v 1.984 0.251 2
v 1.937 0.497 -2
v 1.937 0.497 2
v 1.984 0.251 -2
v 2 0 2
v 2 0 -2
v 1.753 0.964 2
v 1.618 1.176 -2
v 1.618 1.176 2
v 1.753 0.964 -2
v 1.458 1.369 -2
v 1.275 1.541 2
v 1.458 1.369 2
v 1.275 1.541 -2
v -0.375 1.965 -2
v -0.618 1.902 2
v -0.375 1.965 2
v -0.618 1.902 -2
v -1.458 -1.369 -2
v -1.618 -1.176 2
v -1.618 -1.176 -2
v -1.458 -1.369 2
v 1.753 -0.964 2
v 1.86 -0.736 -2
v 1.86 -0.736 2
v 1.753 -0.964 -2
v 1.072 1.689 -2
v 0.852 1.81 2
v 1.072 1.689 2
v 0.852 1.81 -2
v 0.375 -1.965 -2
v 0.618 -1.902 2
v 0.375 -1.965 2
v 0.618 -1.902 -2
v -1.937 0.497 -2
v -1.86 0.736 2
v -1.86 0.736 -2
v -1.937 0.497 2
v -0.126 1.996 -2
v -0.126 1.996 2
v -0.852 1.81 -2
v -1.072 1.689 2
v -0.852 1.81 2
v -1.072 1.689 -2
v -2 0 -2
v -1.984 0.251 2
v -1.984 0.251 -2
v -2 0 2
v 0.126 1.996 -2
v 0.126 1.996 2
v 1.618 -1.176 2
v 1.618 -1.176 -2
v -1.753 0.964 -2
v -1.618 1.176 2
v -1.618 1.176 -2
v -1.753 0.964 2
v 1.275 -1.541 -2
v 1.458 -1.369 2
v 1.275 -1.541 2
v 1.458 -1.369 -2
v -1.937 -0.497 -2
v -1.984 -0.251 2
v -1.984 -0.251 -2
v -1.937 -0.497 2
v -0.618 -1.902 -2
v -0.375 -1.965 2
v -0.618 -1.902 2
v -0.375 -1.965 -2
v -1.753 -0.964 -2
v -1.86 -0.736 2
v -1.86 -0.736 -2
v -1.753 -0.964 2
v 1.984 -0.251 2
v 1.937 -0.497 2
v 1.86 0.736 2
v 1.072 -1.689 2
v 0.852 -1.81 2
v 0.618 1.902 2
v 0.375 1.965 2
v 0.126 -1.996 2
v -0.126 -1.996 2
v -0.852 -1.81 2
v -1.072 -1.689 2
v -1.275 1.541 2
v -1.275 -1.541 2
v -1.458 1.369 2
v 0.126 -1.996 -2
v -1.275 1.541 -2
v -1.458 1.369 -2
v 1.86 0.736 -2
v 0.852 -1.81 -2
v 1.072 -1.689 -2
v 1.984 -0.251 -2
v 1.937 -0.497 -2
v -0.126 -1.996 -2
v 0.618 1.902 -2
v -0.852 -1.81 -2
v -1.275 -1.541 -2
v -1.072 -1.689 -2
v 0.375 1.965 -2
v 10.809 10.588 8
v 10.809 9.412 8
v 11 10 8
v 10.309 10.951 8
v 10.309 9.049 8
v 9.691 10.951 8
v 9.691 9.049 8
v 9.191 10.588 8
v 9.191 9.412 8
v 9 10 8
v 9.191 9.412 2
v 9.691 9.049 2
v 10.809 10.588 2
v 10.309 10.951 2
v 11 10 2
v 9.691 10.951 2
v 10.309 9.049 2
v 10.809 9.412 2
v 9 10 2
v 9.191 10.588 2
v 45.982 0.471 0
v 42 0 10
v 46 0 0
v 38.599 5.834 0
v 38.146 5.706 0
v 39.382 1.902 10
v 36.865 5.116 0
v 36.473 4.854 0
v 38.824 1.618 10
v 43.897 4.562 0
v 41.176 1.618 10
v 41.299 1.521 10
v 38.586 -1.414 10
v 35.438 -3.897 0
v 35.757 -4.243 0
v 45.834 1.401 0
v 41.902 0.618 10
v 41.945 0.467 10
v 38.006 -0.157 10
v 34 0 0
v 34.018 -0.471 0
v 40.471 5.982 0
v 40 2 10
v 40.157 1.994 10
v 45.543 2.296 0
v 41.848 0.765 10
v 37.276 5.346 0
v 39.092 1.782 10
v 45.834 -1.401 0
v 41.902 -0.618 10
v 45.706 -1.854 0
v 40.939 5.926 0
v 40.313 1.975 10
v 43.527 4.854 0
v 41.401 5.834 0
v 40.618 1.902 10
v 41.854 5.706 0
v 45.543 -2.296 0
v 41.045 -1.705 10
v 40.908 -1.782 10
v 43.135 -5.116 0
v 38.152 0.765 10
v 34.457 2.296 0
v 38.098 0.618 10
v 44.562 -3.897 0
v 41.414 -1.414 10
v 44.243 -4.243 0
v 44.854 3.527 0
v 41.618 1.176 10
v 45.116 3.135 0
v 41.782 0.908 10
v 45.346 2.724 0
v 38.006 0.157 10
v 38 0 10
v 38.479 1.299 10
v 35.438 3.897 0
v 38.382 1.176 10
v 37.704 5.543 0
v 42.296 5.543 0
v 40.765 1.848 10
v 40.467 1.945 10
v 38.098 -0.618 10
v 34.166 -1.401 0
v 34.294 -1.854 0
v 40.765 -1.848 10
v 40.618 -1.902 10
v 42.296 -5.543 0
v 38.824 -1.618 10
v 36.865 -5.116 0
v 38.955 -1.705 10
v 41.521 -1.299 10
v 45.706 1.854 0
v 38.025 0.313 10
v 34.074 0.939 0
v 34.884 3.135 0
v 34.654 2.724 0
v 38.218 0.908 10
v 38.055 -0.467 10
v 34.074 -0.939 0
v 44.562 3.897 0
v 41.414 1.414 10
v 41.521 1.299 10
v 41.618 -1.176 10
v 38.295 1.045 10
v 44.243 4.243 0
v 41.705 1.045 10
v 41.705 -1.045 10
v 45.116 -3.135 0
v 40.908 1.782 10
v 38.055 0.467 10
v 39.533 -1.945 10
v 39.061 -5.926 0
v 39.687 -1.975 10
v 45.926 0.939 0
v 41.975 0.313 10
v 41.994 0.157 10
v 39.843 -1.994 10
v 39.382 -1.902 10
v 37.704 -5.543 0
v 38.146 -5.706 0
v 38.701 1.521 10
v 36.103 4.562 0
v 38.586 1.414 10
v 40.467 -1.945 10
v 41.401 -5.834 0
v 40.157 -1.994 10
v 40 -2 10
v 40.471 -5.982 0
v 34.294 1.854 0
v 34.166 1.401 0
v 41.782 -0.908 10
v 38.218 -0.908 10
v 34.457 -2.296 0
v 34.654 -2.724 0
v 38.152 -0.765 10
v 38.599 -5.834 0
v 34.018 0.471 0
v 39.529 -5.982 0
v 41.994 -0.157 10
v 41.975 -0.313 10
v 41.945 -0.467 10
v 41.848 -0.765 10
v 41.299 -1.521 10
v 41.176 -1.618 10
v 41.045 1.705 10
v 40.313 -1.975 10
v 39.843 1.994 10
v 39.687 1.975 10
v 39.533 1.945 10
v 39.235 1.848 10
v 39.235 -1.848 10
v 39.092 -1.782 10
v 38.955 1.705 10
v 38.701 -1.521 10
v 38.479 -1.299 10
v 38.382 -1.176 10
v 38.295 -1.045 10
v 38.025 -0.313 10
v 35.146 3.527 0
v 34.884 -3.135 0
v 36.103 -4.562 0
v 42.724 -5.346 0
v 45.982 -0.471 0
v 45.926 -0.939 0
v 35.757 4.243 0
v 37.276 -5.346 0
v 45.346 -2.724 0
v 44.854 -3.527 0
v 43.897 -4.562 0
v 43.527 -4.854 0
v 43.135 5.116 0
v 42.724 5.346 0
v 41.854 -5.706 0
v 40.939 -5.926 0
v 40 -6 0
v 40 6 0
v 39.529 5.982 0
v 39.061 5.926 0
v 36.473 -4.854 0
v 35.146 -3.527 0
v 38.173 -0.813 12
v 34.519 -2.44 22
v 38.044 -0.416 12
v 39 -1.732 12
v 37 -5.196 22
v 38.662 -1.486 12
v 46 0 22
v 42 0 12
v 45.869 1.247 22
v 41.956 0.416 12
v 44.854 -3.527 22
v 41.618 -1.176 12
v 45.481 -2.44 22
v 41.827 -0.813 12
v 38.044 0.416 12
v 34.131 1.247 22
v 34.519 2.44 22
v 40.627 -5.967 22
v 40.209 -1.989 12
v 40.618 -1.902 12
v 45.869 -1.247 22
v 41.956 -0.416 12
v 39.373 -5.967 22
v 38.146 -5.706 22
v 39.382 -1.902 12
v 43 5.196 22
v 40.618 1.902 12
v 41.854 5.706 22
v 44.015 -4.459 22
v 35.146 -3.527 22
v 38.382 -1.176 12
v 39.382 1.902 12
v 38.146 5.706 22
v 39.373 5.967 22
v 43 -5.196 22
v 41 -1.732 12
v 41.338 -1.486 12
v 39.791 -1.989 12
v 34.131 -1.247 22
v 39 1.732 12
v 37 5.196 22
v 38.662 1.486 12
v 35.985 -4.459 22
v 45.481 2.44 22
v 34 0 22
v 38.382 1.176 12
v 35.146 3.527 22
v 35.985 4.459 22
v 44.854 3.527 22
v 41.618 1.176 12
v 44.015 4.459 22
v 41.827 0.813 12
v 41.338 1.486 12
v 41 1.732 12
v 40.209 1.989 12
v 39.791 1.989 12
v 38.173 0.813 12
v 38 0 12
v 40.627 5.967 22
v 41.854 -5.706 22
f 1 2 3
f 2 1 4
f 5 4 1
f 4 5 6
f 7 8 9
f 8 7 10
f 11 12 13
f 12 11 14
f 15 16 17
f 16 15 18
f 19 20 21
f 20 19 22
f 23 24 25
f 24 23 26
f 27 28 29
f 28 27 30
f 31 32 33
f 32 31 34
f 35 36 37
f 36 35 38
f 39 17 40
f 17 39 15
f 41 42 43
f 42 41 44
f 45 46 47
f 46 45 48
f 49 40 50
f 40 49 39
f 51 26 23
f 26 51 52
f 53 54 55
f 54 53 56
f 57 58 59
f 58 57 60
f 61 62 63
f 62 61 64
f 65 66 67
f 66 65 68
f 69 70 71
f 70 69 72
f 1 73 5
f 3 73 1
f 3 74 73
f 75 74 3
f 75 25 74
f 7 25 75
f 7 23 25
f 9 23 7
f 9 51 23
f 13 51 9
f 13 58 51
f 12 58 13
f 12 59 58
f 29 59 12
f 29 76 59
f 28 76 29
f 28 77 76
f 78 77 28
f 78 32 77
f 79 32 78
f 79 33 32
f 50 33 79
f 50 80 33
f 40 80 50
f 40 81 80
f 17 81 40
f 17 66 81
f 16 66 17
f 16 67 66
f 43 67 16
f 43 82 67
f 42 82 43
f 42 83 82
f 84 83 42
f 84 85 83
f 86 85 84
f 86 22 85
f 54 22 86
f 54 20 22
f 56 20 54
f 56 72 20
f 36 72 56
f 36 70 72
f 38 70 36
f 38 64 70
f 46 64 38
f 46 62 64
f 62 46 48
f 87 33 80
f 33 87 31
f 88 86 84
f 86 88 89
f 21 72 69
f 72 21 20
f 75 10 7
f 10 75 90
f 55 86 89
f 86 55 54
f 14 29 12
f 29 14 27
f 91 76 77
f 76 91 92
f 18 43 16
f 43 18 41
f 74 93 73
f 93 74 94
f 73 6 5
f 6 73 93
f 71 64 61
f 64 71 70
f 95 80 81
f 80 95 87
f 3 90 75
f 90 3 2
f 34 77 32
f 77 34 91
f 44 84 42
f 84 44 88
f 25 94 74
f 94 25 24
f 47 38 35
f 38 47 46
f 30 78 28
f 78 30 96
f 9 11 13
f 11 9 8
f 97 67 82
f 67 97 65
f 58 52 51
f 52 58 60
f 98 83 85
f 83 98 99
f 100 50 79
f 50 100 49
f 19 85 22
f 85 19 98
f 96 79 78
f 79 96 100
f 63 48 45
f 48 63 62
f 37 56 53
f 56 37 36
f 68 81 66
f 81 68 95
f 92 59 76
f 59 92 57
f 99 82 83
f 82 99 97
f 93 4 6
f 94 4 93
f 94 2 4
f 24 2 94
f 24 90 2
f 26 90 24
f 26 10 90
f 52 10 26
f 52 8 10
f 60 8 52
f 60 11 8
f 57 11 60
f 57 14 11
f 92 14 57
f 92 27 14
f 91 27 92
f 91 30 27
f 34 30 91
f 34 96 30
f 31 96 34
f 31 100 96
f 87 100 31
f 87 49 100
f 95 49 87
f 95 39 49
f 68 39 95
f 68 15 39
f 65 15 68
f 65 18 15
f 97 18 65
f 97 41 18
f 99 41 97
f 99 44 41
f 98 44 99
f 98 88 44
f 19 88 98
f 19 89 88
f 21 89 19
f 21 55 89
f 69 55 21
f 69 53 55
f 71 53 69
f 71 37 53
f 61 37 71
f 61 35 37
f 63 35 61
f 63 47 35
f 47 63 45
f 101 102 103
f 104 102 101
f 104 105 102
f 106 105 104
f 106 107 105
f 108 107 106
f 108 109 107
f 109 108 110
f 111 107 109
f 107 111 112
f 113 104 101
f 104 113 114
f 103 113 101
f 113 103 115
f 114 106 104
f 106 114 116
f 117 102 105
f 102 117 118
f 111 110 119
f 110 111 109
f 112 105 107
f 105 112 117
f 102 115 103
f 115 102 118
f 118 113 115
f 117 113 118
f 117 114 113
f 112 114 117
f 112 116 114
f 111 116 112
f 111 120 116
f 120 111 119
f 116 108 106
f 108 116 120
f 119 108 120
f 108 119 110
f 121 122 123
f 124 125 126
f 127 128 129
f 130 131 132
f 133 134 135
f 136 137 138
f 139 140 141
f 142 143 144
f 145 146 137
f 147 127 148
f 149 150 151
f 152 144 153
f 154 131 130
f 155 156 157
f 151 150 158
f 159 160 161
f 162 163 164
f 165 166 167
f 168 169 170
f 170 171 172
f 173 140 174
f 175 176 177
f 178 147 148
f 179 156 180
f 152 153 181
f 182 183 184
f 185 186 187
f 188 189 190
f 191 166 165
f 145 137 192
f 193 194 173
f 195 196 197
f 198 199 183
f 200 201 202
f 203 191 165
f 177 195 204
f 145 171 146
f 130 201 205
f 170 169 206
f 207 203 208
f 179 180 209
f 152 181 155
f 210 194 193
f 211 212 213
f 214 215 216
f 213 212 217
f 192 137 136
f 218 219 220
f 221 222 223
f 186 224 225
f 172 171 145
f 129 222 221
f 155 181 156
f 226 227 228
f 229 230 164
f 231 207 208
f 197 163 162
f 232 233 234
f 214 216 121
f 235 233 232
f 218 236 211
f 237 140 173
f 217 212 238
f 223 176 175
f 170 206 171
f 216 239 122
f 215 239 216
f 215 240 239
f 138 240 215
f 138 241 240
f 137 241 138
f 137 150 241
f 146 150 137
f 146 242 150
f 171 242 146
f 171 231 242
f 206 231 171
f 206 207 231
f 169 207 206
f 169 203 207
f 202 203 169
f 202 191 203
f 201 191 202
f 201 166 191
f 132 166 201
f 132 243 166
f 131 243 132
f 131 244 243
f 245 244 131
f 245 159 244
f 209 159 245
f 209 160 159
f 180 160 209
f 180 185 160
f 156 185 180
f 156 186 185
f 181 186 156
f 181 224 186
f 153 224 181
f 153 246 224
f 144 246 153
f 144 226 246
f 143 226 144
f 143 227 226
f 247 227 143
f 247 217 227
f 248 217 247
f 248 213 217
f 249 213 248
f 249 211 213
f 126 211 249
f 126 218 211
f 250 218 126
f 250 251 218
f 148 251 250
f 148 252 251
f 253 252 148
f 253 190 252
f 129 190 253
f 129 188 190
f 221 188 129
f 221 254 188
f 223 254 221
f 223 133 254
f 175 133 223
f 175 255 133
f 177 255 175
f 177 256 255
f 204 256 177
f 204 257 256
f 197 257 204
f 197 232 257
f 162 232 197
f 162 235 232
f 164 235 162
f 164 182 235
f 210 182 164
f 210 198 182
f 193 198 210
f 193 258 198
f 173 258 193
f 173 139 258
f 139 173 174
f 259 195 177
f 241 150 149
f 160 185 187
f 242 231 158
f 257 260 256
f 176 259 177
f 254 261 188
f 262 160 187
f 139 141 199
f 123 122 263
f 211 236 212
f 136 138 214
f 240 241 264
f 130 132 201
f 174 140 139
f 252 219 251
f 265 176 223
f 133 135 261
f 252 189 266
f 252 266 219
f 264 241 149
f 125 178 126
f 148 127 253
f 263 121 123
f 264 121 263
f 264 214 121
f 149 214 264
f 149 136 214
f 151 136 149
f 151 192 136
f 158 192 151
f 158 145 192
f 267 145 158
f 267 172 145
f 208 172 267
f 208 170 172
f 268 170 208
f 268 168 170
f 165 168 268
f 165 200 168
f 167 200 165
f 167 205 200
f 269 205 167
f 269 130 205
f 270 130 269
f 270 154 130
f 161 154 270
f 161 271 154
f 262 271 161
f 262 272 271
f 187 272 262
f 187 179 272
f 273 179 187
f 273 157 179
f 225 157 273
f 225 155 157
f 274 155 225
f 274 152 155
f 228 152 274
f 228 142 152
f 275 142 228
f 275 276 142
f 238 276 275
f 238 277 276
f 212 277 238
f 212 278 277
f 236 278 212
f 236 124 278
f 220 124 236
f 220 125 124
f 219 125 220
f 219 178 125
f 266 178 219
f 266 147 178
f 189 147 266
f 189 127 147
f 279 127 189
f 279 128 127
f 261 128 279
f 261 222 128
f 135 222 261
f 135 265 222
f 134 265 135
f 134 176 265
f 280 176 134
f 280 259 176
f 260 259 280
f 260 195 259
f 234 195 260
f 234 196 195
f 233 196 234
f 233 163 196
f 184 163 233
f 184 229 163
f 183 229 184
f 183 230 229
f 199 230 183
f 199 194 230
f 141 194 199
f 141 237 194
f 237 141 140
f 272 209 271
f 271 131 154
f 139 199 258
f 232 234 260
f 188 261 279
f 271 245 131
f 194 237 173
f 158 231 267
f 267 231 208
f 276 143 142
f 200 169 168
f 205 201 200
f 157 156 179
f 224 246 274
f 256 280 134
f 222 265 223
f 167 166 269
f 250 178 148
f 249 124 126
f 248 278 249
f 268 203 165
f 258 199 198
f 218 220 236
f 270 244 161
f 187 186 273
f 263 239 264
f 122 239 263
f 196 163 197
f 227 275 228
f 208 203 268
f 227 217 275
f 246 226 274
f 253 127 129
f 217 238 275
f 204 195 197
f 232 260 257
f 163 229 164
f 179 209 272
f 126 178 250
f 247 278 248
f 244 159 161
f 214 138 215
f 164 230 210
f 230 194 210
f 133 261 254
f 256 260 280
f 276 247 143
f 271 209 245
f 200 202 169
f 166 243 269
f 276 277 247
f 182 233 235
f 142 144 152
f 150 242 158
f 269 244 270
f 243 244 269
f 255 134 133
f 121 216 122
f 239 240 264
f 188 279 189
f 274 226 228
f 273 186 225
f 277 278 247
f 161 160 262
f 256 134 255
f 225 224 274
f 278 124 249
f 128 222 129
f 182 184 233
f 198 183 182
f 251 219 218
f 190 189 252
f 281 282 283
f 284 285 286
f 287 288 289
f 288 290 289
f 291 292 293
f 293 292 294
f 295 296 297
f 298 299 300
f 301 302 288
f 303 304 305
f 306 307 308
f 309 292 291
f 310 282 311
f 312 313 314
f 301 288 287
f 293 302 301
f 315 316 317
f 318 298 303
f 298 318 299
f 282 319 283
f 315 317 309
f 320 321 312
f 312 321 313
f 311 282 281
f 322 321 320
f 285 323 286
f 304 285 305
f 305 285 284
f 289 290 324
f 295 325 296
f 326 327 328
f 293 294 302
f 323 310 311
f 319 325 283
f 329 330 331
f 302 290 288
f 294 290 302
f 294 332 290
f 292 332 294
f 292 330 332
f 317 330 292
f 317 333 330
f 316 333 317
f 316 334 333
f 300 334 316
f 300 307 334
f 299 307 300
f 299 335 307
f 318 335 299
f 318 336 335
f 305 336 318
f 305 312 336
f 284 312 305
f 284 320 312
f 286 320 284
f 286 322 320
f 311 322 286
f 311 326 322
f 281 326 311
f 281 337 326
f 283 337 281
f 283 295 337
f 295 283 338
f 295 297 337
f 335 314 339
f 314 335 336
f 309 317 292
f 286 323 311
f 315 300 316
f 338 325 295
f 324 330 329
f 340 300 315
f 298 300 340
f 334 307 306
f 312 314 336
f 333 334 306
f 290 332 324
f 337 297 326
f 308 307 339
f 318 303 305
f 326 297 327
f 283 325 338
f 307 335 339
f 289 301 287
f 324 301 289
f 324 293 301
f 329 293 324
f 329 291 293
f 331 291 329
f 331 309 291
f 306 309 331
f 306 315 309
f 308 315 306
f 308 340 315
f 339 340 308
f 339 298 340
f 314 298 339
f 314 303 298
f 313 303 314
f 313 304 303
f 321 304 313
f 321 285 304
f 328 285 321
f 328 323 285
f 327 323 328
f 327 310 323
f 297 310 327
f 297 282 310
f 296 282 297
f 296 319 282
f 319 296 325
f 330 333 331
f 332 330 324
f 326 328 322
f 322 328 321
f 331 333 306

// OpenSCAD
/*

Sage Ridge Robotics OpenSCAD file.
Christopher von Nagy, July 2014.

Example 02 cylinders. 

Usage: The circle_of_columns() module takes
one variable, the angle between each column.


*/


// Cylinders
// We use the cylinder command to construct cylindrical objects. 
// Note how $fn controls the number of faces (smoothness) of the 
// object
translate([0,0,0]) cylinder(r=2,h=4, center=true, $fn=50);
translate([10,10,5]) cylinder(r=1,h=6, center=true, $fn=10);

// We'll set the default $fn to 30 for now
$fn=30;

// cylinder() can be used to draw conical objects by setting
// each of the two associated radii to a differnt value
translate([40,0,0]) cylinder(r1=6,r2=2,h=10, $fn=80);
translate([40,0,12]) cylinder(r1=2, r2=6,h=10);

/*

License code:

Creative Commons Atribution 4.0

Attribution — You must give appropriate credit, provide a link to the license, and indicate if changes were made. You may do so in any reasonable manner, but not in any way that suggests the licensor endorses you or your use.

No additional restrictions — You may not apply legal terms or technological measures that legally restrict others from doing anything the license permits.


*/
